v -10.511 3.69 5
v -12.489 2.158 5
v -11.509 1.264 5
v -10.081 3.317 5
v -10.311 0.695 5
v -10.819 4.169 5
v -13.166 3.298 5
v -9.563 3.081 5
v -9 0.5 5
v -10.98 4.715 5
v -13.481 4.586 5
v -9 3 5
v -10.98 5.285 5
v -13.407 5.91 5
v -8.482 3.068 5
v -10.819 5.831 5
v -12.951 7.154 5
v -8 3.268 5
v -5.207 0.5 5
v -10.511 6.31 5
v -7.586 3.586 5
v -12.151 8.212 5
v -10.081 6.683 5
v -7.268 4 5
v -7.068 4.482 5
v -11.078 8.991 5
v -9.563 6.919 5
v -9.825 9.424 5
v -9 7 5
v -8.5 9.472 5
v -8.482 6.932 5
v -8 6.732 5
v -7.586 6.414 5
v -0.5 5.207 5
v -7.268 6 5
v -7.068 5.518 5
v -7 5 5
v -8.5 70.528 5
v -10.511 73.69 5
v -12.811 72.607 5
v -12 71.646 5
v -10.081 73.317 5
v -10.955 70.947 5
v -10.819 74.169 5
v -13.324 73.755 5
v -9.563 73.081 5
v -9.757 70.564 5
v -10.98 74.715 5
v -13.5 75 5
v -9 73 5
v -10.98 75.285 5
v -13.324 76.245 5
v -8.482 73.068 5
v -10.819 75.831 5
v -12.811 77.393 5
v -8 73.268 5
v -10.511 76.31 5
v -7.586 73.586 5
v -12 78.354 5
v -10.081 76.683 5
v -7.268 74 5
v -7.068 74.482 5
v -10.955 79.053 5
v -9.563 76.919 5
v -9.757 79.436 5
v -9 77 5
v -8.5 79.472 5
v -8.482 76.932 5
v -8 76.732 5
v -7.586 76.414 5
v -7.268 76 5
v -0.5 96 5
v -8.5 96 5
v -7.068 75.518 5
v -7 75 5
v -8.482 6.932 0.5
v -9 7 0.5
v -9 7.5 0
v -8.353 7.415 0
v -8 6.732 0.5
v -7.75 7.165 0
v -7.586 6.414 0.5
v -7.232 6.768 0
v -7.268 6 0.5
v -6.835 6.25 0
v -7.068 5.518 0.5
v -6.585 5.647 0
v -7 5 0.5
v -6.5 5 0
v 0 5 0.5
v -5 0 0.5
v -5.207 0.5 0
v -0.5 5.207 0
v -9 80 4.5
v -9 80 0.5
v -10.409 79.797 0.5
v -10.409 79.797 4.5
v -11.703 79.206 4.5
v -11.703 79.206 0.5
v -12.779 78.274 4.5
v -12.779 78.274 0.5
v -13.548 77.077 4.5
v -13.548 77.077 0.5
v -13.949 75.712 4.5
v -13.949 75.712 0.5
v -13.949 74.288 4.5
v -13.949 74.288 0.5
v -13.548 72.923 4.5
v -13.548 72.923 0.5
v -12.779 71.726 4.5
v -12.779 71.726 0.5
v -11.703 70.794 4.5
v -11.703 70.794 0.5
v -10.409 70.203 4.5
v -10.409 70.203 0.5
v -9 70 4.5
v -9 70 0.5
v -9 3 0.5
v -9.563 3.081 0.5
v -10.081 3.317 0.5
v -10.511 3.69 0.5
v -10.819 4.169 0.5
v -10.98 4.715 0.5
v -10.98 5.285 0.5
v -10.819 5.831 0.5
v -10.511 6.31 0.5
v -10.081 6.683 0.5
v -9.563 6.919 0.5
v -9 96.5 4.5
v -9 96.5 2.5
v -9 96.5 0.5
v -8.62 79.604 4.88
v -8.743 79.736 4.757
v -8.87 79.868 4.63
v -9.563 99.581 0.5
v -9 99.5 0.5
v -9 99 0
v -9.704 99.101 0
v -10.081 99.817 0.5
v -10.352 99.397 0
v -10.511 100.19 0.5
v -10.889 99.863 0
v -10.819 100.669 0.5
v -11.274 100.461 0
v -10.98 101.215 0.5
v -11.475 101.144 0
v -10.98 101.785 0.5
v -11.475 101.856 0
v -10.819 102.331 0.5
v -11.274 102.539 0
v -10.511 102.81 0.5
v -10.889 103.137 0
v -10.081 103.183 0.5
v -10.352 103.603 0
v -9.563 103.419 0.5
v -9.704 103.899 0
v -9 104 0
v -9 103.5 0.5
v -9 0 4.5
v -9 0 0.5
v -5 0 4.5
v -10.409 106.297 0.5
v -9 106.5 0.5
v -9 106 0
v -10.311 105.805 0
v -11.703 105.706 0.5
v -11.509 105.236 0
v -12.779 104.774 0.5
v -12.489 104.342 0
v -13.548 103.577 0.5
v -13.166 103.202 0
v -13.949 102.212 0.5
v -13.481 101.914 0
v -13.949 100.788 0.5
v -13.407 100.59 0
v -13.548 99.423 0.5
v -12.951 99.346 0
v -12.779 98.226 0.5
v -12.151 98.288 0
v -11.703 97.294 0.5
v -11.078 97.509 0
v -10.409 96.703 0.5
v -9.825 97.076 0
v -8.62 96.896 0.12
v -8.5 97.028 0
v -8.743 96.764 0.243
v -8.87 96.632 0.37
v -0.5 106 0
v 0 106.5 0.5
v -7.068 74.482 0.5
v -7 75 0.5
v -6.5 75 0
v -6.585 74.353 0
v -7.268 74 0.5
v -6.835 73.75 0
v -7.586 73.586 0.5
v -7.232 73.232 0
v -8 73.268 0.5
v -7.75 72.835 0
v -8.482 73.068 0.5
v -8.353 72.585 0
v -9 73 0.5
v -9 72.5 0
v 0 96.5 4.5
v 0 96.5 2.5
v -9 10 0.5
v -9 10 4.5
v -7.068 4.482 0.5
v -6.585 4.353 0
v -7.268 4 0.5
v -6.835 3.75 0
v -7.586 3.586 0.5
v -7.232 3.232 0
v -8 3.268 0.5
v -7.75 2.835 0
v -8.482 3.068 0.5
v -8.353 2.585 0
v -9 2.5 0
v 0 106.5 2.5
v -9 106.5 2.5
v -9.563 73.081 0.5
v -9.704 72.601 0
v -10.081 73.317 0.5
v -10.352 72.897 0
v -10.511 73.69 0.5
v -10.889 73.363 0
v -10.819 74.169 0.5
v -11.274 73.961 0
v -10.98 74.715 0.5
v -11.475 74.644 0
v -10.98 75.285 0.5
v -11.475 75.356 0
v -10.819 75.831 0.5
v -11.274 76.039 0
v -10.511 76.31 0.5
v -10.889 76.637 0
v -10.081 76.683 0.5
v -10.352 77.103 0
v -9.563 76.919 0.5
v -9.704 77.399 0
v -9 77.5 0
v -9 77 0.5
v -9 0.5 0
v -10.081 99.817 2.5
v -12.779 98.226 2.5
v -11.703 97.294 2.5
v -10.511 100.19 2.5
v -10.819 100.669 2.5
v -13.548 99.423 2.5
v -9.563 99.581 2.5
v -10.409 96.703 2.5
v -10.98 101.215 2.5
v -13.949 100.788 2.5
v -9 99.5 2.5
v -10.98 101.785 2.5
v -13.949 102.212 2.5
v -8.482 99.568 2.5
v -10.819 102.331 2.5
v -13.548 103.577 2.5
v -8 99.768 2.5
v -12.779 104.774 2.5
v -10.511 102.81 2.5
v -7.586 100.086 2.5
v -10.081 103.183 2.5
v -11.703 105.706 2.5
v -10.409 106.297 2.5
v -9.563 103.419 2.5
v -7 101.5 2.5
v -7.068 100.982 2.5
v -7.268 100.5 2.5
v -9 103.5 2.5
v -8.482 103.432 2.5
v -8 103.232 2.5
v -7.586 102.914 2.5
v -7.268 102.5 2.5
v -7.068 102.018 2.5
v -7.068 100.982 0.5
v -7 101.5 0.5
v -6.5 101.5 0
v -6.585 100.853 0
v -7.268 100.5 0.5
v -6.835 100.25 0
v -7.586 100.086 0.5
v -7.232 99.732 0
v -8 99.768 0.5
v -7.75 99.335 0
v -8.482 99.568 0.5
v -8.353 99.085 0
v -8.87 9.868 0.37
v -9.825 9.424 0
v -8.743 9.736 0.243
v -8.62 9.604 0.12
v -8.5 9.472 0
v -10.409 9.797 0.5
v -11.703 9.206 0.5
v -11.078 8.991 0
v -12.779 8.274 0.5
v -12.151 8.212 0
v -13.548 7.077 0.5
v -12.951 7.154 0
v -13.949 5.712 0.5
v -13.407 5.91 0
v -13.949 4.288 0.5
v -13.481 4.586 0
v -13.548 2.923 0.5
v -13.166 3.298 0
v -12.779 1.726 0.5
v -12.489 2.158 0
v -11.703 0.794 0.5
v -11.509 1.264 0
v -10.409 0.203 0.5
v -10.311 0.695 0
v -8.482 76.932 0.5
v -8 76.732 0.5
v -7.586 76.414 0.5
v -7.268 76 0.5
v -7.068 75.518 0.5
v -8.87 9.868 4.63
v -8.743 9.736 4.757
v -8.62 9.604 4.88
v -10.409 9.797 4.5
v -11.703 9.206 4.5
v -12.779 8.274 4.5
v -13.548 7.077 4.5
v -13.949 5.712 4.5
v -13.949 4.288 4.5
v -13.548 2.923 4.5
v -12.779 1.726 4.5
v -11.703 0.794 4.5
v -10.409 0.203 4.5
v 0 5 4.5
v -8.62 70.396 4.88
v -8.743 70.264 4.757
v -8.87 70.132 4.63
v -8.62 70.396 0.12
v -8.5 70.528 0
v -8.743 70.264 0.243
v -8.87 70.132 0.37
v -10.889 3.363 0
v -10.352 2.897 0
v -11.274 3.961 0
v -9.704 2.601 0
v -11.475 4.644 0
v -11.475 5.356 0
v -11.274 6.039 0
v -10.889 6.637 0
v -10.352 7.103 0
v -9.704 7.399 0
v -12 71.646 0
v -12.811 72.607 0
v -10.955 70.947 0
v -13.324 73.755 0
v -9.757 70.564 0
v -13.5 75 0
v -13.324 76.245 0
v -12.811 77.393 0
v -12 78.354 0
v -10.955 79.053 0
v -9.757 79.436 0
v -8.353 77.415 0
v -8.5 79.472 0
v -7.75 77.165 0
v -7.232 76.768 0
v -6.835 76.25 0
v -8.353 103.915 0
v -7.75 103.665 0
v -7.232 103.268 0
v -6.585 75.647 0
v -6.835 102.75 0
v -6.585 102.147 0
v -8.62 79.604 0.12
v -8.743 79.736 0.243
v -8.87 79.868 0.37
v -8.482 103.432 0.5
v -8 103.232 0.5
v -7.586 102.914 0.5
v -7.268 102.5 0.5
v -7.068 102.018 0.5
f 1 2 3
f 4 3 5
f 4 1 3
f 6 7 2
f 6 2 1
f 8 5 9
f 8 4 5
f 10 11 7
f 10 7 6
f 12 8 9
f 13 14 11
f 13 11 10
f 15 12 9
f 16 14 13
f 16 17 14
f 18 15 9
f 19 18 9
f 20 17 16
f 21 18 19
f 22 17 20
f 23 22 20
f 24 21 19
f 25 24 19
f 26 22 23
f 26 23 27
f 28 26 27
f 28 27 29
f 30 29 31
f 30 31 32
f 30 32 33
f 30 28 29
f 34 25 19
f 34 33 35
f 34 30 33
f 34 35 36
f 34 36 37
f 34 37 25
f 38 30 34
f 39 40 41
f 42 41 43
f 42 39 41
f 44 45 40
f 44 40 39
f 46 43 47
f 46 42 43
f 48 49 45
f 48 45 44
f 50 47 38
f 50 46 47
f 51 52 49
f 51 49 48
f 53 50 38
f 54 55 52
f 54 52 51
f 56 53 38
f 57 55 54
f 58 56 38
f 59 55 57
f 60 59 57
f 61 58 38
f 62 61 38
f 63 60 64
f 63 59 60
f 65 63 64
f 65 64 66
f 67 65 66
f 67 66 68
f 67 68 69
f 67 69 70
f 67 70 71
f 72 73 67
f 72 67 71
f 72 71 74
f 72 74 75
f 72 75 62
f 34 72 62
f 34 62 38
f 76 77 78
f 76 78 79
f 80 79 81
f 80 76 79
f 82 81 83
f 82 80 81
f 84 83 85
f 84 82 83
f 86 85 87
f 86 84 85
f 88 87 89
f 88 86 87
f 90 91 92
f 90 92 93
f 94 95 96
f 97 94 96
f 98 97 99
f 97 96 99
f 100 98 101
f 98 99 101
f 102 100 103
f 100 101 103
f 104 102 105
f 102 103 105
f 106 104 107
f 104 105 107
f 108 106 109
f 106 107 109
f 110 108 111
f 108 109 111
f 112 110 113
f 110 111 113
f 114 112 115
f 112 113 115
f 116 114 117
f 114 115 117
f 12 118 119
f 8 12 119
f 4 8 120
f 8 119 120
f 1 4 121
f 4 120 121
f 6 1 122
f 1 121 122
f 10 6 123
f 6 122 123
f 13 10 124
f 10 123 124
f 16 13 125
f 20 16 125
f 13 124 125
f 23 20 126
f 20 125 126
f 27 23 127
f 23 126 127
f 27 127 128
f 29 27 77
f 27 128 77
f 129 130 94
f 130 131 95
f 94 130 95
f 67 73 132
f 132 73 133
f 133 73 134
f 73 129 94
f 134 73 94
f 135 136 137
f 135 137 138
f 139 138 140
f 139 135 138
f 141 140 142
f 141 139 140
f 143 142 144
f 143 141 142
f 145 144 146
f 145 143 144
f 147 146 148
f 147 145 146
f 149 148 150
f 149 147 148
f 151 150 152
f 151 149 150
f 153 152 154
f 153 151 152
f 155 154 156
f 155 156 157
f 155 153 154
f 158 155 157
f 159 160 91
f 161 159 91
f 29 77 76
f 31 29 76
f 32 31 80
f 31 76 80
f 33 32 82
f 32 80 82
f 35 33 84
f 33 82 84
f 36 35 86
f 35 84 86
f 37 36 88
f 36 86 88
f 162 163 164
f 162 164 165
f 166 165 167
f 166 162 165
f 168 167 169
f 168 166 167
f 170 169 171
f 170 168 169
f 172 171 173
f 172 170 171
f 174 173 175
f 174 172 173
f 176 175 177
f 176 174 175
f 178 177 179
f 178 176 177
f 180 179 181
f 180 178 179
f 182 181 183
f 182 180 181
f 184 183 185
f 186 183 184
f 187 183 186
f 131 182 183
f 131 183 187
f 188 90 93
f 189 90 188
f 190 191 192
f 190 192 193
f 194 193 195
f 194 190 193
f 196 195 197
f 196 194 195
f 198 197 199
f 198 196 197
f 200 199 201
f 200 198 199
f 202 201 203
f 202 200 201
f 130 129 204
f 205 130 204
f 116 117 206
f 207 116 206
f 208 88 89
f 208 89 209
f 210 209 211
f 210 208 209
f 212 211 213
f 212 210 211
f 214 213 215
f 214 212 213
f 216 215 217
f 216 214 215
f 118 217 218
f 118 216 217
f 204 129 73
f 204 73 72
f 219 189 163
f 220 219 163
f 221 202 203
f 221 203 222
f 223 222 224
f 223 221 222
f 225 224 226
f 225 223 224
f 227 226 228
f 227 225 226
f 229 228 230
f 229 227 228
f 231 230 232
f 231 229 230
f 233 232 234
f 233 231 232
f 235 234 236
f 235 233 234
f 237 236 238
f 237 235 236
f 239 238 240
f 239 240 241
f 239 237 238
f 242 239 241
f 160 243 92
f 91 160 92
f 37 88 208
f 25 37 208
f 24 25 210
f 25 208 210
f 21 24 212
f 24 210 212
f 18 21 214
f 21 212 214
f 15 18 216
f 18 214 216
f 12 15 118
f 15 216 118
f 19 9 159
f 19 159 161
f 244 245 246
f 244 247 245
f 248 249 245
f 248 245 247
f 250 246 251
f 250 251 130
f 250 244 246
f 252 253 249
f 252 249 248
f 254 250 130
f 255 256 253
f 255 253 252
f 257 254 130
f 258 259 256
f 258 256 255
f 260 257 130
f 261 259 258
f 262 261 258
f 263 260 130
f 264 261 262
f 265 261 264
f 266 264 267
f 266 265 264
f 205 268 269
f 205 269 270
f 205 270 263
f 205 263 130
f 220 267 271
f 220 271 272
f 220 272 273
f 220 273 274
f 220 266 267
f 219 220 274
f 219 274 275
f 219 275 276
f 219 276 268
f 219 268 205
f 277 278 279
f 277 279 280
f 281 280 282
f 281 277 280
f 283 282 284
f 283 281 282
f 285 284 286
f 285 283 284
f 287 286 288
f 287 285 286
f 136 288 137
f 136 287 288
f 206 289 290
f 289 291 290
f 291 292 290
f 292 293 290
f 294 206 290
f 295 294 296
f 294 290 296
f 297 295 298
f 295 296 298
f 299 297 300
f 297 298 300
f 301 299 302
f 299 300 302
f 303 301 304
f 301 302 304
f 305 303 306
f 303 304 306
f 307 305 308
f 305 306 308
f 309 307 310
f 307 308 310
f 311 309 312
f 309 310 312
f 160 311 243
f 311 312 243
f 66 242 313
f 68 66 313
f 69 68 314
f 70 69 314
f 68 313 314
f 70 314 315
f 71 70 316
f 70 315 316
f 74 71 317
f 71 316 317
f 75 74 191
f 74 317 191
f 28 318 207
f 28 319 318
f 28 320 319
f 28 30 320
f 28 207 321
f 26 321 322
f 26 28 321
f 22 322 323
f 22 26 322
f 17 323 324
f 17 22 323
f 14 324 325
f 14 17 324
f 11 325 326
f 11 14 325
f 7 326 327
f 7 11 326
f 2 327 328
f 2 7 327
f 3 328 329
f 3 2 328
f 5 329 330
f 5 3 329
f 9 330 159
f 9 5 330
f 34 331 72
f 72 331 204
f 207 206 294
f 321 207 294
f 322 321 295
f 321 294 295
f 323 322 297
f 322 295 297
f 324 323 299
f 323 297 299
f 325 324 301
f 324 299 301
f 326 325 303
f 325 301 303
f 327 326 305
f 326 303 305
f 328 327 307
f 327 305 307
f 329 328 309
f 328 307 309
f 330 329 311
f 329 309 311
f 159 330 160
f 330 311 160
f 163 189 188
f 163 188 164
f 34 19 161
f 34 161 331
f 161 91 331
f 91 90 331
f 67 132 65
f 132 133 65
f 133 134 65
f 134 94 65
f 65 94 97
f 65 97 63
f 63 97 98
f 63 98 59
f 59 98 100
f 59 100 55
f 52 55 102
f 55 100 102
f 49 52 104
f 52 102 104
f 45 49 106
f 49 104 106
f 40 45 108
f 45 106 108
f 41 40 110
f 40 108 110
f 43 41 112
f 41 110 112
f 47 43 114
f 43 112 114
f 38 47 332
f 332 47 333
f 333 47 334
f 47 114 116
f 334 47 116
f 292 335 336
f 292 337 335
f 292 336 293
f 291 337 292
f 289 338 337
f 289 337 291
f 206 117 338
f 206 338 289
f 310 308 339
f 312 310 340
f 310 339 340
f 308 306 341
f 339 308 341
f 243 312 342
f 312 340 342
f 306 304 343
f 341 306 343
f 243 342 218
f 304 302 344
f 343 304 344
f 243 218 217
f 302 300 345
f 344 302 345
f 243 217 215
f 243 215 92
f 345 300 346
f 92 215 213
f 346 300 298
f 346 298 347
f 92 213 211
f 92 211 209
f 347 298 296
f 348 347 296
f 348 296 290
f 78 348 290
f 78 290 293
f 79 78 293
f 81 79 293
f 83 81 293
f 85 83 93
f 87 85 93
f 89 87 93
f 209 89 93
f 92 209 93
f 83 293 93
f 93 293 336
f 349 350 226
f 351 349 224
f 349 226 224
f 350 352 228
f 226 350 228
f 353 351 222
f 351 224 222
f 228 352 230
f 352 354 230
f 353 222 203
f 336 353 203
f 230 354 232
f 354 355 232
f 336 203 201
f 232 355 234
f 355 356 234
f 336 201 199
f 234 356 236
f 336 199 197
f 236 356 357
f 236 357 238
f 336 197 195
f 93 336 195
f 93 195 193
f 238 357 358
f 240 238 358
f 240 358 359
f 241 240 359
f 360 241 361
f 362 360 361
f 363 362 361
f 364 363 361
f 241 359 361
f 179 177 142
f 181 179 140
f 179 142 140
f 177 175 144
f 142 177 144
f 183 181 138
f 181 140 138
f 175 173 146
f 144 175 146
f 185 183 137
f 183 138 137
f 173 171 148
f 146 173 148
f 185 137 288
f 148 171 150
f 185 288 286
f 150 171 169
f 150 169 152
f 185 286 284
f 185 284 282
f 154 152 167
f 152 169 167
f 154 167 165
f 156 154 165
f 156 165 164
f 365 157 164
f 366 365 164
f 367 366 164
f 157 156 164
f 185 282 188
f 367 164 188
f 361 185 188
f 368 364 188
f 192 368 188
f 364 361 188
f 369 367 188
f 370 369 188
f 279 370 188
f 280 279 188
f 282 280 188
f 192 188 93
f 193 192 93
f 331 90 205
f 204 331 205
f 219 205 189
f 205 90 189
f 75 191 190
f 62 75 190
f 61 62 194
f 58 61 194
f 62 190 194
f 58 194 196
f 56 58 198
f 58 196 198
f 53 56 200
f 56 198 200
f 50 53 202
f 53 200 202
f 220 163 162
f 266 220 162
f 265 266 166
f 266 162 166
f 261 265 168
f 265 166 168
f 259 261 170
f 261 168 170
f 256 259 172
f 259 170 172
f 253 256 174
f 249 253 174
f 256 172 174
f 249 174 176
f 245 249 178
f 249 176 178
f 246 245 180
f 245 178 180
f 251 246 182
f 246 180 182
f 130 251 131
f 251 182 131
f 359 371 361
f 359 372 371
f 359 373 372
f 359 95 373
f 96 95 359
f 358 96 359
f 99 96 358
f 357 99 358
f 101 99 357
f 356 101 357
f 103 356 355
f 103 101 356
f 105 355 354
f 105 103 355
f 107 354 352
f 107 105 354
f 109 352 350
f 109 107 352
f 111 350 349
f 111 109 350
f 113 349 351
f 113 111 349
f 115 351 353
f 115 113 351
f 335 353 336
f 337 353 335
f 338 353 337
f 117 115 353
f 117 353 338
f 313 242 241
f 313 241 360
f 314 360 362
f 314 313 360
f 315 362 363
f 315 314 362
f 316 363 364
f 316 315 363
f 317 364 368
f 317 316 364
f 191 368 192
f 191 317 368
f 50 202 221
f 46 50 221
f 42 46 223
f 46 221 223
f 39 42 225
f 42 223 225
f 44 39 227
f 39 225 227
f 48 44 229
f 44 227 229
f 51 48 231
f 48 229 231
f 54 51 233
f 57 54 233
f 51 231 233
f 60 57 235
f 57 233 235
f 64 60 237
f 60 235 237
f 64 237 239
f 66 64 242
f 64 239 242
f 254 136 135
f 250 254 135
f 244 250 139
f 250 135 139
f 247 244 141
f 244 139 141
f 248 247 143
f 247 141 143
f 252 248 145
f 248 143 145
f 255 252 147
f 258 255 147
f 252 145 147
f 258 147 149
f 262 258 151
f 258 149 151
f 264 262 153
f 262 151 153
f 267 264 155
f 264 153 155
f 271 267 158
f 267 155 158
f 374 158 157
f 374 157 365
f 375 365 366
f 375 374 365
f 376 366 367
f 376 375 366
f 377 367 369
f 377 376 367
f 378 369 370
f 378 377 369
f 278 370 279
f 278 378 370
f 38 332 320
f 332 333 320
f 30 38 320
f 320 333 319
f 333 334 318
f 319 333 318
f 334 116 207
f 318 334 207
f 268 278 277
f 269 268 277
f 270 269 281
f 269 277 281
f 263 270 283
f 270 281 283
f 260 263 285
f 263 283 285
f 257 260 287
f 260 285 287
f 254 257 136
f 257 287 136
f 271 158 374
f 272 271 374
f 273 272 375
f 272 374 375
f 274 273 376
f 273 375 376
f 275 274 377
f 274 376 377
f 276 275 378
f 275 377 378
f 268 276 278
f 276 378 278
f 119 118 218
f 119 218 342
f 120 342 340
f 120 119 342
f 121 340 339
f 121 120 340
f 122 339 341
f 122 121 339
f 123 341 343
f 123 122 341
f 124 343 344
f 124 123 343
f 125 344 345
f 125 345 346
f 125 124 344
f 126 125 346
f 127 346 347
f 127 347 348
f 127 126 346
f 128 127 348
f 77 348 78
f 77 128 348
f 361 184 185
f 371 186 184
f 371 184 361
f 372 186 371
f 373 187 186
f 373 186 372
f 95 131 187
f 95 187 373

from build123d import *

# Parameters (mm, degrees)
F1_DEPTH = 5
F3_DEPTH = 2.5
F4_SIZE  = 5
F5_SIZE  = 0.5


with BuildPart() as f1:
    # F0 (on Top) → F1 (new body)
    with BuildSketch(Plane.XY):
        with BuildLine():
            Line((-9, 0), (0, 0))
            Line((0, 0), (0, 106.5))
            Line((0, 106.5), (-9, 106.5))
            Line((-9, 106.5), (-9, 103.5))
            ThreePointArc((-9, 103.5), (-7.5857864376, 102.9142135624), (-7, 101.5))
            ThreePointArc((-7, 101.5), (-7.5857864376, 100.0857864376), (-9, 99.5))
            Line((-9, 99.5), (-9, 96.5))
            Line((-9, 96.5), (-9, 80))
            Line((-9, 80), (-9, 77))
            ThreePointArc((-9, 77), (-7.5857864376, 76.4142135624), (-7, 75))
            ThreePointArc((-7, 75), (-7.5857864376, 73.5857864376), (-9, 73))
            Line((-9, 73), (-9, 70))
            Line((-9, 70), (-9, 10))
            Line((-9, 10), (-9, 7))
            ThreePointArc((-9, 7), (-7.5857864376, 6.4142135624), (-7, 5))
            ThreePointArc((-7, 5), (-7.5857864376, 3.5857864376), (-9, 3))
            Line((-9, 3), (-9, 0))
        make_face()
        with BuildLine():
            ThreePointArc((-9, 10), (-14, 5), (-9, 0))
            Line((-9, 0), (-9, 3))
            ThreePointArc((-9, 3), (-11, 5), (-9, 7))
            Line((-9, 7), (-9, 10))
        make_face()
        with BuildLine():
            Line((-9, 103.5), (-9, 106.5))
            ThreePointArc((-9, 106.5), (-14, 101.5), (-9, 96.5))
            Line((-9, 96.5), (-9, 99.5))
            ThreePointArc((-9, 99.5), (-11, 101.5), (-9, 103.5))
        make_face()
        with BuildLine():
            ThreePointArc((-9, 80), (-14, 75), (-9, 70))
            Line((-9, 70), (-9, 73))
            ThreePointArc((-9, 73), (-11, 75), (-9, 77))
            Line((-9, 77), (-9, 80))
        make_face()
    extrude(amount=F1_DEPTH)

    # F2 (on face) → F3 (cut)
    with BuildSketch(Plane.XY.offset(5)):
        with BuildLine():
            ThreePointArc((-9, 106.5), (-14, 101.5), (-9, 96.5))
            Line((-9, 96.5), (0, 96.5))
            Line((0, 96.5), (0, 106.5))
            Line((0, 106.5), (-9, 106.5))
        make_face()
    extrude(amount=-F3_DEPTH, mode=Mode.SUBTRACT)

    # F4
    f4_edges = [f1.edges().sort_by_distance(p)[0] for p in [
        (0, 0, 2.5),
    ]]
    chamfer(f4_edges, length=F4_SIZE)

    # F5
    f5_edges = [f1.edges().sort_by_distance(p)[0] for p in [
        (-7, 0, 0),
        (-2.5, 2.5, 0),
        (-14, 5, 0),
        (0, 55.75, 0),
        (-9, 40, 0),
        (-4.5, 106.5, 0),
        (-14, 75, 0),
        (-14, 101.5, 0),
        (-9, 88.25, 0),
        (-9, 77, 0),
        (-9, 103.5, 0),
        (-11, 5, 0),
        (-4.5, 96.5, 5),
        (0, 50.75, 5),
        (-9, 88.25, 5),
        (-14, 75, 5),
        (-2.5, 2.5, 5),
        (-7, 0, 5),
        (-14, 5, 5),
        (-9, 40, 5),
    ]]
    chamfer(f5_edges, length=F5_SIZE)


solid = f1.part
